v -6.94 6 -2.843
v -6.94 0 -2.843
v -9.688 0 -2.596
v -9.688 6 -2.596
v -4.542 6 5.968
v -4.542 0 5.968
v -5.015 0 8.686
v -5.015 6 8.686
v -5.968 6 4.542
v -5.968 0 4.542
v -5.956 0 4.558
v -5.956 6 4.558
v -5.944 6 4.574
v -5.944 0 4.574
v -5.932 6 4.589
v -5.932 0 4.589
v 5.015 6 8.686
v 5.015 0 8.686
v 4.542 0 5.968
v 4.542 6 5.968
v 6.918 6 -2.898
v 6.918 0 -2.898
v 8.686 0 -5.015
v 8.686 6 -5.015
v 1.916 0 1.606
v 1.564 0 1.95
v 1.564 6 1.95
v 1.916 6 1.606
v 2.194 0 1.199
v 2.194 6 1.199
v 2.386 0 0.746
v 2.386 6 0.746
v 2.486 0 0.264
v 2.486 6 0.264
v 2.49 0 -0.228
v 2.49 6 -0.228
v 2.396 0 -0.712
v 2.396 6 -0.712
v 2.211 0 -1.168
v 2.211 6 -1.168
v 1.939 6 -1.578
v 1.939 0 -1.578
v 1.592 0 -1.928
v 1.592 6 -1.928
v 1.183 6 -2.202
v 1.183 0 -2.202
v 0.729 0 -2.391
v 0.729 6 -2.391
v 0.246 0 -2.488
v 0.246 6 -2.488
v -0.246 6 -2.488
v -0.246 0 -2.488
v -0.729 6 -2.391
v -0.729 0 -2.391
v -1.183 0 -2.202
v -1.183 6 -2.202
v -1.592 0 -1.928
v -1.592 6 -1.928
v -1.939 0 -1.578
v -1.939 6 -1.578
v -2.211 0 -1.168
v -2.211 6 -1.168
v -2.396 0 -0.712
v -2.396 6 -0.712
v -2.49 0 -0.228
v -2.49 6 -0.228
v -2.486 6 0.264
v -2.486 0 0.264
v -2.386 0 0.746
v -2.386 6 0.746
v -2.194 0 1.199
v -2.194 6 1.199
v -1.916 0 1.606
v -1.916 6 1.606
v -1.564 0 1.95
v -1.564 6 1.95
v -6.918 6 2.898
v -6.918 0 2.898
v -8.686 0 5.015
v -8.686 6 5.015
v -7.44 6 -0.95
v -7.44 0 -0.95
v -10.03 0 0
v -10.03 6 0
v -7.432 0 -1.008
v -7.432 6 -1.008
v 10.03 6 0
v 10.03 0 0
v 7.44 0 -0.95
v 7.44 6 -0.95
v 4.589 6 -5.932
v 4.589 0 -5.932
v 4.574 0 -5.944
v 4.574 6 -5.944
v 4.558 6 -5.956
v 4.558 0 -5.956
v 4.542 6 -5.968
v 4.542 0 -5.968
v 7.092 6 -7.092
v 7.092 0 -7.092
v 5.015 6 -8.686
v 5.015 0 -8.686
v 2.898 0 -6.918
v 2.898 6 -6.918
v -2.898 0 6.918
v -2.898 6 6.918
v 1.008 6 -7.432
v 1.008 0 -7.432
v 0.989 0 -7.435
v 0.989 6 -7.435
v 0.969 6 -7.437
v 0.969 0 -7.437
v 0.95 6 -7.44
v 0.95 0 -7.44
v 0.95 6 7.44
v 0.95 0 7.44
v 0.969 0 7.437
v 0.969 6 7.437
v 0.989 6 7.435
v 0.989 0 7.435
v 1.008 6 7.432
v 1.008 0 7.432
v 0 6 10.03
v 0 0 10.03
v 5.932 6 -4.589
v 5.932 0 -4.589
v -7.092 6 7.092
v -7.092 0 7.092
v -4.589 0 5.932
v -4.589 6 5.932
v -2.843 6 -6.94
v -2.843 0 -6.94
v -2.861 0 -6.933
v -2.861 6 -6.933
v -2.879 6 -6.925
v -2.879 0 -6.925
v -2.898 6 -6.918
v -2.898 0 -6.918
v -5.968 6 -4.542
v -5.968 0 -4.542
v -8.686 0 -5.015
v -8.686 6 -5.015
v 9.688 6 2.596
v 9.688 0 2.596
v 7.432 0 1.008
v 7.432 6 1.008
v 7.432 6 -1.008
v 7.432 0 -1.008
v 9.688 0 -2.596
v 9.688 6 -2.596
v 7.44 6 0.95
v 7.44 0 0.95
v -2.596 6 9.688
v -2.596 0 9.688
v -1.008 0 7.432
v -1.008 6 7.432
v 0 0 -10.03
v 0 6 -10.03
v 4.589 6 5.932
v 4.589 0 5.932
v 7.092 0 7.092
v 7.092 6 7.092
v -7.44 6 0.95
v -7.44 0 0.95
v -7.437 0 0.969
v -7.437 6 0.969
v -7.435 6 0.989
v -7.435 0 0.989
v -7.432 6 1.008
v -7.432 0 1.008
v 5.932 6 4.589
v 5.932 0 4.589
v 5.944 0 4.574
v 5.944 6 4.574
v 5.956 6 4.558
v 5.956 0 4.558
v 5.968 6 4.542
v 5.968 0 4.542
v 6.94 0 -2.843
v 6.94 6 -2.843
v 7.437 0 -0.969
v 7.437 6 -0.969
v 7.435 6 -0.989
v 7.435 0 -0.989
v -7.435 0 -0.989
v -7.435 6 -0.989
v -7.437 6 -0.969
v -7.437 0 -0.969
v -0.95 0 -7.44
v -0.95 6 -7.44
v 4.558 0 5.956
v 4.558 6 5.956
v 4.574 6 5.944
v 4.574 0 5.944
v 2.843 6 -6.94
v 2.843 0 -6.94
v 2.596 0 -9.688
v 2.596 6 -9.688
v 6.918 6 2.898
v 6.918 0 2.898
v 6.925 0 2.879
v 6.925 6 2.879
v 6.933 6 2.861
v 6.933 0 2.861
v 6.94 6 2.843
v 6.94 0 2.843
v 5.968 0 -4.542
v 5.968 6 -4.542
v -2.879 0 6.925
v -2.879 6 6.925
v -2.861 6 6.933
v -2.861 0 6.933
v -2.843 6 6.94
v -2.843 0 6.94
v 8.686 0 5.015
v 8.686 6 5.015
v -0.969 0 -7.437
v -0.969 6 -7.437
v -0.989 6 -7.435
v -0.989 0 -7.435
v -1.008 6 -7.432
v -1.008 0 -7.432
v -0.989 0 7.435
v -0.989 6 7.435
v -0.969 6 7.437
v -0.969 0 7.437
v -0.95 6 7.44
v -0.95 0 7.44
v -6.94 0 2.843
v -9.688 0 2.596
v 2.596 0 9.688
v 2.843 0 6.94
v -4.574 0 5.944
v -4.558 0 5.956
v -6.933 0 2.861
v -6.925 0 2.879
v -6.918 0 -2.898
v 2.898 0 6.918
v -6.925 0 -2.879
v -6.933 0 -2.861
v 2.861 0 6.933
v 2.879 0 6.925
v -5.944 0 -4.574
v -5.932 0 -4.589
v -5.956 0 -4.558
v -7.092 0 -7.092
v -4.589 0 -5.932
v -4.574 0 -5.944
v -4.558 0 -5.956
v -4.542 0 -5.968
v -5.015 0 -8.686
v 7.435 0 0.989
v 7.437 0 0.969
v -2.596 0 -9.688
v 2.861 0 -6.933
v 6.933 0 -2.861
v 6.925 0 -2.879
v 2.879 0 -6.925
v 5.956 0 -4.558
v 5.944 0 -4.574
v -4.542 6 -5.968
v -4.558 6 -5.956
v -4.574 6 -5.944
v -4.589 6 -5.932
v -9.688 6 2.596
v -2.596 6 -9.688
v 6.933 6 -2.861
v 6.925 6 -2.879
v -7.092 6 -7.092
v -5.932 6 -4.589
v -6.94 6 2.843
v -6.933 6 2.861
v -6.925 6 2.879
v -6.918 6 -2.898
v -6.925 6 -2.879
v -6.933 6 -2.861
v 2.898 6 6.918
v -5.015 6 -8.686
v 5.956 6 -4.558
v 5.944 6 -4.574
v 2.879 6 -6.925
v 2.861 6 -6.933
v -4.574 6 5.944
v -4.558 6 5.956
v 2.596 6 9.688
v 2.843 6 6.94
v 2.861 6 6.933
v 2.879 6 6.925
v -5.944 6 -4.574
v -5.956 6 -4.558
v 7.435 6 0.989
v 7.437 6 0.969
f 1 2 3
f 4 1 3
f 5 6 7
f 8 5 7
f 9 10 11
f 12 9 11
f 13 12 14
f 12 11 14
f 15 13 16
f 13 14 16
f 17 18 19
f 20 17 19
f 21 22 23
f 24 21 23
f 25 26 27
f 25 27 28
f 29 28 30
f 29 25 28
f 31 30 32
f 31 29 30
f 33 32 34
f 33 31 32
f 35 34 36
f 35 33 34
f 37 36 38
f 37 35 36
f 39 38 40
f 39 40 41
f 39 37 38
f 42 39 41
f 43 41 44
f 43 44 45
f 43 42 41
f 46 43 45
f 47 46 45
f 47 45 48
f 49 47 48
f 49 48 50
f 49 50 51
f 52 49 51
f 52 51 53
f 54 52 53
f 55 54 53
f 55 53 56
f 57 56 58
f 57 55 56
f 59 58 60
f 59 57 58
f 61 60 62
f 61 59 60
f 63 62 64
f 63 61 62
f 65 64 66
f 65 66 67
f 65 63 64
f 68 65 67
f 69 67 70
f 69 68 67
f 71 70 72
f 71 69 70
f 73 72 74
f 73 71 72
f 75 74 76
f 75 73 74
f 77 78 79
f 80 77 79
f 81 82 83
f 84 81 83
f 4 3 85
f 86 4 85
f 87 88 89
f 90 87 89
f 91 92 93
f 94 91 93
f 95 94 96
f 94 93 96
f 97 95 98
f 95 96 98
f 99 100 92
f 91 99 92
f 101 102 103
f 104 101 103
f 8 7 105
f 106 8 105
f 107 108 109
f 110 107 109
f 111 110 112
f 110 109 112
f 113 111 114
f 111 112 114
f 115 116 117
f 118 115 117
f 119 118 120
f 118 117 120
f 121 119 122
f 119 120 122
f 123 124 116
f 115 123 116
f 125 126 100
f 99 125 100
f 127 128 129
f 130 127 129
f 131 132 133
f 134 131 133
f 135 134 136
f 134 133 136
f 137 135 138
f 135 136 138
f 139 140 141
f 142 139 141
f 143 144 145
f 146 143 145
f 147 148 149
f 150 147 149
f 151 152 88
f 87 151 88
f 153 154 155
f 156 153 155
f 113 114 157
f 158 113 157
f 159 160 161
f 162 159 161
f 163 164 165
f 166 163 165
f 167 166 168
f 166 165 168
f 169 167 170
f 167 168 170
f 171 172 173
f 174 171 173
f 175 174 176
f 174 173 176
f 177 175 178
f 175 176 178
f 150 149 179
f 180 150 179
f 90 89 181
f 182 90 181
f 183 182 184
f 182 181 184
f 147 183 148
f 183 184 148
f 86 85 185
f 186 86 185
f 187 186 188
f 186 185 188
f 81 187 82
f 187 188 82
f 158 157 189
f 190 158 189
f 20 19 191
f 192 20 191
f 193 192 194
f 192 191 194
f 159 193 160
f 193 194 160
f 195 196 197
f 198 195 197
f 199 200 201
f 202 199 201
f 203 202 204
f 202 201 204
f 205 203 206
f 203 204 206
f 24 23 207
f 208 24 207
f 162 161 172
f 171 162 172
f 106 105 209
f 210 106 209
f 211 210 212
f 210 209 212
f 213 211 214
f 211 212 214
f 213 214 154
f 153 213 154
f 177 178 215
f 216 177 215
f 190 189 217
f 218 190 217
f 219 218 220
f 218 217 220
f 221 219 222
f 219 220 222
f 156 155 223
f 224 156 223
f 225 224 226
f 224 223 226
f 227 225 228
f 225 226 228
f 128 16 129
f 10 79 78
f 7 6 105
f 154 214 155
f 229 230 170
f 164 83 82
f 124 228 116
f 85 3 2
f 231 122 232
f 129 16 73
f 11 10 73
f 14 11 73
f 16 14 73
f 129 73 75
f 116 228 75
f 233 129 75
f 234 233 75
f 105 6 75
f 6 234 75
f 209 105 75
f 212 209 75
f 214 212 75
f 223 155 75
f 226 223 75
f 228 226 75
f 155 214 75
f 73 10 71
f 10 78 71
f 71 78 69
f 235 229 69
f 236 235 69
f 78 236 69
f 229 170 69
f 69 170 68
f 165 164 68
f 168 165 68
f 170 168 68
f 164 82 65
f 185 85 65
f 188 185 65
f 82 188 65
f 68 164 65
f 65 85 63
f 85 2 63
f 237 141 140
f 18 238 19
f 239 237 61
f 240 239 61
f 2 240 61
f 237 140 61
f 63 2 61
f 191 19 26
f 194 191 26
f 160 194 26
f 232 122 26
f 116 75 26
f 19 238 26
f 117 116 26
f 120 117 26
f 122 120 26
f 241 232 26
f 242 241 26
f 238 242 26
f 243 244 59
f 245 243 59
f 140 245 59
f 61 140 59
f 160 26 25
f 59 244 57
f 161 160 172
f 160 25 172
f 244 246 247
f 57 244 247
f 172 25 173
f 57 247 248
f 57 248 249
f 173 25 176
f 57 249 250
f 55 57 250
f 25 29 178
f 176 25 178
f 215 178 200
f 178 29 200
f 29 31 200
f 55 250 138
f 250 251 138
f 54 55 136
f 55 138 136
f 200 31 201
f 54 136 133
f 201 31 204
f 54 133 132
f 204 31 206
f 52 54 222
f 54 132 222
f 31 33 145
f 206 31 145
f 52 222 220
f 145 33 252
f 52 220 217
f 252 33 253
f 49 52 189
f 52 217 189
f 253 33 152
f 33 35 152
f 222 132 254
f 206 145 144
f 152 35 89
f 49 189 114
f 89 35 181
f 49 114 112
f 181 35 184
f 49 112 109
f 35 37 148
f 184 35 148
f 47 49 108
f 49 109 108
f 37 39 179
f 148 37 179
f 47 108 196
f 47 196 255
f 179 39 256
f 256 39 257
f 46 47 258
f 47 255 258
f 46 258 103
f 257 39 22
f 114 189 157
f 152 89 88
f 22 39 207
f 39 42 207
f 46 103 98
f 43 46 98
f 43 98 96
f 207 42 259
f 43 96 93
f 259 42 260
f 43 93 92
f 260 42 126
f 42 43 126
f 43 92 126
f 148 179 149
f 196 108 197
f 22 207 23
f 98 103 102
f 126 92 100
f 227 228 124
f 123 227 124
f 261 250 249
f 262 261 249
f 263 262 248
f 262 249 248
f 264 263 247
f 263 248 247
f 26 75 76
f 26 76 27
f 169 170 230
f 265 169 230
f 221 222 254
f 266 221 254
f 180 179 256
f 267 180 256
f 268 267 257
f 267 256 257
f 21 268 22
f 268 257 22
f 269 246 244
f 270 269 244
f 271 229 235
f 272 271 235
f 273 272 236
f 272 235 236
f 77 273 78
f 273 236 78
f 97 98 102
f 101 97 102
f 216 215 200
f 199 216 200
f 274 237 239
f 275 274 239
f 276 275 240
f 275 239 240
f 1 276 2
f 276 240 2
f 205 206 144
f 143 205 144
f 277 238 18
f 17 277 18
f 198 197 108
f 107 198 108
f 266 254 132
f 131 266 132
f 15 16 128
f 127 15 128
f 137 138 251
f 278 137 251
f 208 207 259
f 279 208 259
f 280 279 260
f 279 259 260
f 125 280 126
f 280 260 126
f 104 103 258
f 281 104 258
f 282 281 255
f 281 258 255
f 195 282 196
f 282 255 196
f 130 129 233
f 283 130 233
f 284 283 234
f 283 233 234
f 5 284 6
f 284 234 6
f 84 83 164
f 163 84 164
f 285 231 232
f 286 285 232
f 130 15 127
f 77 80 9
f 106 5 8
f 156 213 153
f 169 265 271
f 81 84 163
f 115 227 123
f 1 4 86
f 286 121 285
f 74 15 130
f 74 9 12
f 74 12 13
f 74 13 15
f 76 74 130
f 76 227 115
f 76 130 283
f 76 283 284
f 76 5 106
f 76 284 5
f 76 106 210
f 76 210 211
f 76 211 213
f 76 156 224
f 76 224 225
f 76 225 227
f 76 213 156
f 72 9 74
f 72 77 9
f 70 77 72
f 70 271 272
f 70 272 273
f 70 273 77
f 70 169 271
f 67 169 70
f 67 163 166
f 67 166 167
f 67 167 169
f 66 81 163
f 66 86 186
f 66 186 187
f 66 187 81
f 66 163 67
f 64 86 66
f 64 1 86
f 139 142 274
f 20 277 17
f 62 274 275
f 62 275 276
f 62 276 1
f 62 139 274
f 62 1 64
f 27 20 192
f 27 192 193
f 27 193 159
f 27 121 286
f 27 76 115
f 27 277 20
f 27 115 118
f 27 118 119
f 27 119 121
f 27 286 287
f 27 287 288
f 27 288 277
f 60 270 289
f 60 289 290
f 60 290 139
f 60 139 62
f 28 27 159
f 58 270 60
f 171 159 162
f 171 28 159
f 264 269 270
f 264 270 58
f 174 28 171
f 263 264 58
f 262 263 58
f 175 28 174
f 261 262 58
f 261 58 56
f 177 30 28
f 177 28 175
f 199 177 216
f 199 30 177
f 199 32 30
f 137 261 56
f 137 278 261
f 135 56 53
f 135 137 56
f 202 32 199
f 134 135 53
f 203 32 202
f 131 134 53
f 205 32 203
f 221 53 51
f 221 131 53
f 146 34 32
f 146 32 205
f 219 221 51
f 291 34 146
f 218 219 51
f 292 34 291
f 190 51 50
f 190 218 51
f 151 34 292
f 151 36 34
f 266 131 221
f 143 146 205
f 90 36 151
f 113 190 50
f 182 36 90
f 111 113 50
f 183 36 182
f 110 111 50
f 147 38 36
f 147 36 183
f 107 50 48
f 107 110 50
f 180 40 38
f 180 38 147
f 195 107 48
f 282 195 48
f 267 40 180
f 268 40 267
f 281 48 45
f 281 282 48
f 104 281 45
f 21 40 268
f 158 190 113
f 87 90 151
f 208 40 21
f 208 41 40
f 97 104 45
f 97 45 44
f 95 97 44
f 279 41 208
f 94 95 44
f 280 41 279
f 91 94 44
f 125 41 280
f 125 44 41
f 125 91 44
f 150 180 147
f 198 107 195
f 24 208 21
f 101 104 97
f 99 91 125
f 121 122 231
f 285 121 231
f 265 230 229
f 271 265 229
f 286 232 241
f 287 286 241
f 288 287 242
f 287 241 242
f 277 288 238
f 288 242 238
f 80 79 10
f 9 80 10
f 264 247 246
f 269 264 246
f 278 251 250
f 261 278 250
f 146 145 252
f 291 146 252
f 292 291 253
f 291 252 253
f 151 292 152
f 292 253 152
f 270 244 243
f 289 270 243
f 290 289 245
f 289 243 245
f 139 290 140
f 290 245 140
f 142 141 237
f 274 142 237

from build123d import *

# Parameters (mm, degrees)
SKETCH_1_R      = 7.5
EXTRUDE_2_DEPTH = 6


with BuildPart() as part:
    # Эскиз1 → Бобышка-Вытянуть2 (new body)
    # profile 1 of 25: a face of its own
    with BuildSketch(Plane(origin=(0, 0, 0), x_dir=(1, 0, 0), z_dir=(0, 1, 0))):
        Circle(SKETCH_1_R)
        with BuildLine():
            Line((-1.564448785, -1.95), (1.564448785, -1.95))
            ThreePointArc((1.564448785, -1.95), (0, 2.5), (-1.564448785, -1.95))
        make_face(mode=Mode.SUBTRACT)
    # profile 2 of 25: a face of its own
    with BuildSketch(Plane(origin=(0, 0, 0), x_dir=(1, 0, 0), z_dir=(0, 1, 0))):
        with BuildLine():
            Line((0, 10.03), (-0.949523561, 7.439650866))
            ThreePointArc((-0.949523561, 7.439650866), (0, 7.5), (0.949523561, 7.439650866))
            Line((0.949523561, 7.439650866), (0, 10.03))
        make_face()
    # profile 3 of 25: a face of its own
    with BuildSketch(Plane(origin=(0, 0, 0), x_dir=(1, 0, 0), z_dir=(0, 1, 0))):
        with BuildLine():
            ThreePointArc((-2.842692663, 6.940396129), (-1.941142838, 7.244443697), (-1.008354003, 7.431905691))
            Line((-1.008354003, 7.431905691), (-2.595955022, 9.688236038))
            Line((-2.595955022, 9.688236038), (-2.842692663, 6.940396129))
        make_face()
    # profile 4 of 25: a face of its own
    with BuildSketch(Plane(origin=(0, 0, 0), x_dir=(1, 0, 0), z_dir=(0, 1, 0))):
        with BuildLine():
            ThreePointArc((-4.542136958, 5.968164865), (-3.75, 6.495190528), (-2.897513908, 6.917688426))
            Line((-2.897513908, 6.917688426), (-5.015, 8.6862348))
            Line((-5.015, 8.6862348), (-4.542136958, 5.968164865))
        make_face()
    # profile 5 of 25: a face of its own
    with BuildSketch(Plane(origin=(0, 0, 0), x_dir=(1, 0, 0), z_dir=(0, 1, 0))):
        with BuildLine():
            ThreePointArc((-5.932042126, 4.589213028), (-5.303300859, 5.303300859), (-4.589213028, 5.932042126))
            Line((-4.589213028, 5.932042126), (-7.092281015, 7.092281015))
            Line((-7.092281015, 7.092281015), (-5.932042126, 4.589213028))
        make_face()
    # profile 6 of 25: a face of its own
    with BuildSketch(Plane(origin=(0, 0, 0), x_dir=(1, 0, 0), z_dir=(0, 1, 0))):
        with BuildLine():
            ThreePointArc((-6.917688426, 2.897513908), (-6.495190528, 3.75), (-5.968164865, 4.542136958))
            Line((-5.968164865, 4.542136958), (-8.6862348, 5.015))
            Line((-8.6862348, 5.015), (-6.917688426, 2.897513908))
        make_face()
    # profile 7 of 25: a face of its own
    with BuildSketch(Plane(origin=(0, 0, 0), x_dir=(1, 0, 0), z_dir=(0, 1, 0))):
        with BuildLine():
            ThreePointArc((-7.431905691, 1.008354003), (-7.244443697, 1.941142838), (-6.940396129, 2.842692663))
            Line((-6.940396129, 2.842692663), (-9.688236038, 2.595955022))
            Line((-9.688236038, 2.595955022), (-7.431905691, 1.008354003))
        make_face()
    # profile 8 of 25: a face of its own
    with BuildSketch(Plane(origin=(0, 0, 0), x_dir=(1, 0, 0), z_dir=(0, 1, 0))):
        with BuildLine():
            ThreePointArc((-7.439650866, -0.949523561), (-7.5, 0), (-7.439650866, 0.949523561))
            Line((-7.439650866, 0.949523561), (-10.03, 0))
            Line((-10.03, 0), (-7.439650866, -0.949523561))
        make_face()
    # profile 9 of 25: a face of its own
    with BuildSketch(Plane(origin=(0, 0, 0), x_dir=(1, 0, 0), z_dir=(0, 1, 0))):
        with BuildLine():
            ThreePointArc((-6.940396129, -2.842692663), (-7.244443697, -1.941142838), (-7.431905691, -1.008354003))
            Line((-7.431905691, -1.008354003), (-9.688236038, -2.595955022))
            Line((-9.688236038, -2.595955022), (-6.940396129, -2.842692663))
        make_face()
    # profile 10 of 25: a face of its own
    with BuildSketch(Plane(origin=(0, 0, 0), x_dir=(1, 0, 0), z_dir=(0, 1, 0))):
        with BuildLine():
            ThreePointArc((-5.968164865, -4.542136958), (-6.495190528, -3.75), (-6.917688426, -2.897513908))
            Line((-6.917688426, -2.897513908), (-8.6862348, -5.015))
            Line((-8.6862348, -5.015), (-5.968164865, -4.542136958))
        make_face()
    # profile 11 of 25: a face of its own
    with BuildSketch(Plane(origin=(0, 0, 0), x_dir=(1, 0, 0), z_dir=(0, 1, 0))):
        with BuildLine():
            ThreePointArc((-4.589213028, -5.932042126), (-5.303300859, -5.303300859), (-5.932042126, -4.589213028))
            Line((-5.932042126, -4.589213028), (-7.092281015, -7.092281015))
            Line((-7.092281015, -7.092281015), (-4.589213028, -5.932042126))
        make_face()
    # profile 12 of 25: a face of its own
    with BuildSketch(Plane(origin=(0, 0, 0), x_dir=(1, 0, 0), z_dir=(0, 1, 0))):
        with BuildLine():
            ThreePointArc((-2.897513908, -6.917688426), (-3.75, -6.495190528), (-4.542136958, -5.968164865))
            Line((-4.542136958, -5.968164865), (-5.015, -8.6862348))
            Line((-5.015, -8.6862348), (-2.897513908, -6.917688426))
        make_face()
    # profile 13 of 25: a face of its own
    with BuildSketch(Plane(origin=(0, 0, 0), x_dir=(1, 0, 0), z_dir=(0, 1, 0))):
        with BuildLine():
            ThreePointArc((-1.008354003, -7.431905691), (-1.941142838, -7.244443697), (-2.842692663, -6.940396129))
            Line((-2.842692663, -6.940396129), (-2.595955022, -9.688236038))
            Line((-2.595955022, -9.688236038), (-1.008354003, -7.431905691))
        make_face()
    # profile 14 of 25: a face of its own
    with BuildSketch(Plane(origin=(0, 0, 0), x_dir=(1, 0, 0), z_dir=(0, 1, 0))):
        with BuildLine():
            ThreePointArc((0.949523561, -7.439650866), (0, -7.5), (-0.949523561, -7.439650866))
            Line((-0.949523561, -7.439650866), (0, -10.03))
            Line((0, -10.03), (0.949523561, -7.439650866))
        make_face()
    # profile 15 of 25: a face of its own
    with BuildSketch(Plane(origin=(0, 0, 0), x_dir=(1, 0, 0), z_dir=(0, 1, 0))):
        with BuildLine():
            Line((2.595955022, -9.688236038), (2.842692663, -6.940396129))
            ThreePointArc((2.842692663, -6.940396129), (1.941142838, -7.244443697), (1.008354003, -7.431905691))
            Line((1.008354003, -7.431905691), (2.595955022, -9.688236038))
        make_face()
    # profile 16 of 25: a face of its own
    with BuildSketch(Plane(origin=(0, 0, 0), x_dir=(1, 0, 0), z_dir=(0, 1, 0))):
        with BuildLine():
            Line((5.015, -8.6862348), (4.542136958, -5.968164865))
            ThreePointArc((4.542136958, -5.968164865), (3.75, -6.495190528), (2.897513908, -6.917688426))
            Line((2.897513908, -6.917688426), (5.015, -8.6862348))
        make_face()
    # profile 17 of 25: a face of its own
    with BuildSketch(Plane(origin=(0, 0, 0), x_dir=(1, 0, 0), z_dir=(0, 1, 0))):
        with BuildLine():
            Line((7.092281015, -7.092281015), (5.932042126, -4.589213028))
            ThreePointArc((5.932042126, -4.589213028), (5.303300859, -5.303300859), (4.589213028, -5.932042126))
            Line((4.589213028, -5.932042126), (7.092281015, -7.092281015))
        make_face()
    # profile 18 of 25: a face of its own
    with BuildSketch(Plane(origin=(0, 0, 0), x_dir=(1, 0, 0), z_dir=(0, 1, 0))):
        with BuildLine():
            Line((8.6862348, -5.015), (6.917688426, -2.897513908))
            ThreePointArc((6.917688426, -2.897513908), (6.495190528, -3.75), (5.968164865, -4.542136958))
            Line((5.968164865, -4.542136958), (8.6862348, -5.015))
        make_face()
    # profile 19 of 25: a face of its own
    with BuildSketch(Plane(origin=(0, 0, 0), x_dir=(1, 0, 0), z_dir=(0, 1, 0))):
        with BuildLine():
            Line((9.688236038, -2.595955022), (7.431905691, -1.008354003))
            ThreePointArc((7.431905691, -1.008354003), (7.244443697, -1.941142838), (6.940396129, -2.842692663))
            Line((6.940396129, -2.842692663), (9.688236038, -2.595955022))
        make_face()
    # profile 20 of 25: a face of its own
    with BuildSketch(Plane(origin=(0, 0, 0), x_dir=(1, 0, 0), z_dir=(0, 1, 0))):
        with BuildLine():
            Line((10.03, 0), (7.439650866, 0.949523561))
            ThreePointArc((7.439650866, 0.949523561), (7.484897511, 0.475719721), (7.5, 0))
            ThreePointArc((7.5, 0), (7.484897511, -0.475719721), (7.439650866, -0.949523561))
            Line((7.439650866, -0.949523561), (10.03, 0))
        make_face()
    # profile 21 of 25: a face of its own
    with BuildSketch(Plane(origin=(0, 0, 0), x_dir=(1, 0, 0), z_dir=(0, 1, 0))):
        with BuildLine():
            Line((9.688236038, 2.595955022), (6.940396129, 2.842692663))
            ThreePointArc((6.940396129, 2.842692663), (7.244443697, 1.941142838), (7.431905691, 1.008354003))
            Line((7.431905691, 1.008354003), (9.688236038, 2.595955022))
        make_face()
    # profile 22 of 25: a face of its own
    with BuildSketch(Plane(origin=(0, 0, 0), x_dir=(1, 0, 0), z_dir=(0, 1, 0))):
        with BuildLine():
            Line((8.6862348, 5.015), (5.968164865, 4.542136958))
            ThreePointArc((5.968164865, 4.542136958), (6.495190528, 3.75), (6.917688426, 2.897513908))
            Line((6.917688426, 2.897513908), (8.6862348, 5.015))
        make_face()
    # profile 23 of 25: a face of its own
    with BuildSketch(Plane(origin=(0, 0, 0), x_dir=(1, 0, 0), z_dir=(0, 1, 0))):
        with BuildLine():
            Line((7.092281015, 7.092281015), (4.589213028, 5.932042126))
            ThreePointArc((4.589213028, 5.932042126), (5.303300859, 5.303300859), (5.932042126, 4.589213028))
            Line((5.932042126, 4.589213028), (7.092281015, 7.092281015))
        make_face()
    # profile 24 of 25: a face of its own
    with BuildSketch(Plane(origin=(0, 0, 0), x_dir=(1, 0, 0), z_dir=(0, 1, 0))):
        with BuildLine():
            Line((5.015, 8.6862348), (2.897513908, 6.917688426))
            ThreePointArc((2.897513908, 6.917688426), (3.75, 6.495190528), (4.542136958, 5.968164865))
            Line((4.542136958, 5.968164865), (5.015, 8.6862348))
        make_face()
    # profile 25 of 25: a face of its own
    with BuildSketch(Plane(origin=(0, 0, 0), x_dir=(1, 0, 0), z_dir=(0, 1, 0))):
        with BuildLine():
            Line((2.595955022, 9.688236038), (1.008354003, 7.431905691))
            ThreePointArc((1.008354003, 7.431905691), (1.941142838, 7.244443697), (2.842692663, 6.940396129))
            Line((2.842692663, 6.940396129), (2.595955022, 9.688236038))
        make_face()
    extrude(amount=EXTRUDE_2_DEPTH)


solid = part.part
